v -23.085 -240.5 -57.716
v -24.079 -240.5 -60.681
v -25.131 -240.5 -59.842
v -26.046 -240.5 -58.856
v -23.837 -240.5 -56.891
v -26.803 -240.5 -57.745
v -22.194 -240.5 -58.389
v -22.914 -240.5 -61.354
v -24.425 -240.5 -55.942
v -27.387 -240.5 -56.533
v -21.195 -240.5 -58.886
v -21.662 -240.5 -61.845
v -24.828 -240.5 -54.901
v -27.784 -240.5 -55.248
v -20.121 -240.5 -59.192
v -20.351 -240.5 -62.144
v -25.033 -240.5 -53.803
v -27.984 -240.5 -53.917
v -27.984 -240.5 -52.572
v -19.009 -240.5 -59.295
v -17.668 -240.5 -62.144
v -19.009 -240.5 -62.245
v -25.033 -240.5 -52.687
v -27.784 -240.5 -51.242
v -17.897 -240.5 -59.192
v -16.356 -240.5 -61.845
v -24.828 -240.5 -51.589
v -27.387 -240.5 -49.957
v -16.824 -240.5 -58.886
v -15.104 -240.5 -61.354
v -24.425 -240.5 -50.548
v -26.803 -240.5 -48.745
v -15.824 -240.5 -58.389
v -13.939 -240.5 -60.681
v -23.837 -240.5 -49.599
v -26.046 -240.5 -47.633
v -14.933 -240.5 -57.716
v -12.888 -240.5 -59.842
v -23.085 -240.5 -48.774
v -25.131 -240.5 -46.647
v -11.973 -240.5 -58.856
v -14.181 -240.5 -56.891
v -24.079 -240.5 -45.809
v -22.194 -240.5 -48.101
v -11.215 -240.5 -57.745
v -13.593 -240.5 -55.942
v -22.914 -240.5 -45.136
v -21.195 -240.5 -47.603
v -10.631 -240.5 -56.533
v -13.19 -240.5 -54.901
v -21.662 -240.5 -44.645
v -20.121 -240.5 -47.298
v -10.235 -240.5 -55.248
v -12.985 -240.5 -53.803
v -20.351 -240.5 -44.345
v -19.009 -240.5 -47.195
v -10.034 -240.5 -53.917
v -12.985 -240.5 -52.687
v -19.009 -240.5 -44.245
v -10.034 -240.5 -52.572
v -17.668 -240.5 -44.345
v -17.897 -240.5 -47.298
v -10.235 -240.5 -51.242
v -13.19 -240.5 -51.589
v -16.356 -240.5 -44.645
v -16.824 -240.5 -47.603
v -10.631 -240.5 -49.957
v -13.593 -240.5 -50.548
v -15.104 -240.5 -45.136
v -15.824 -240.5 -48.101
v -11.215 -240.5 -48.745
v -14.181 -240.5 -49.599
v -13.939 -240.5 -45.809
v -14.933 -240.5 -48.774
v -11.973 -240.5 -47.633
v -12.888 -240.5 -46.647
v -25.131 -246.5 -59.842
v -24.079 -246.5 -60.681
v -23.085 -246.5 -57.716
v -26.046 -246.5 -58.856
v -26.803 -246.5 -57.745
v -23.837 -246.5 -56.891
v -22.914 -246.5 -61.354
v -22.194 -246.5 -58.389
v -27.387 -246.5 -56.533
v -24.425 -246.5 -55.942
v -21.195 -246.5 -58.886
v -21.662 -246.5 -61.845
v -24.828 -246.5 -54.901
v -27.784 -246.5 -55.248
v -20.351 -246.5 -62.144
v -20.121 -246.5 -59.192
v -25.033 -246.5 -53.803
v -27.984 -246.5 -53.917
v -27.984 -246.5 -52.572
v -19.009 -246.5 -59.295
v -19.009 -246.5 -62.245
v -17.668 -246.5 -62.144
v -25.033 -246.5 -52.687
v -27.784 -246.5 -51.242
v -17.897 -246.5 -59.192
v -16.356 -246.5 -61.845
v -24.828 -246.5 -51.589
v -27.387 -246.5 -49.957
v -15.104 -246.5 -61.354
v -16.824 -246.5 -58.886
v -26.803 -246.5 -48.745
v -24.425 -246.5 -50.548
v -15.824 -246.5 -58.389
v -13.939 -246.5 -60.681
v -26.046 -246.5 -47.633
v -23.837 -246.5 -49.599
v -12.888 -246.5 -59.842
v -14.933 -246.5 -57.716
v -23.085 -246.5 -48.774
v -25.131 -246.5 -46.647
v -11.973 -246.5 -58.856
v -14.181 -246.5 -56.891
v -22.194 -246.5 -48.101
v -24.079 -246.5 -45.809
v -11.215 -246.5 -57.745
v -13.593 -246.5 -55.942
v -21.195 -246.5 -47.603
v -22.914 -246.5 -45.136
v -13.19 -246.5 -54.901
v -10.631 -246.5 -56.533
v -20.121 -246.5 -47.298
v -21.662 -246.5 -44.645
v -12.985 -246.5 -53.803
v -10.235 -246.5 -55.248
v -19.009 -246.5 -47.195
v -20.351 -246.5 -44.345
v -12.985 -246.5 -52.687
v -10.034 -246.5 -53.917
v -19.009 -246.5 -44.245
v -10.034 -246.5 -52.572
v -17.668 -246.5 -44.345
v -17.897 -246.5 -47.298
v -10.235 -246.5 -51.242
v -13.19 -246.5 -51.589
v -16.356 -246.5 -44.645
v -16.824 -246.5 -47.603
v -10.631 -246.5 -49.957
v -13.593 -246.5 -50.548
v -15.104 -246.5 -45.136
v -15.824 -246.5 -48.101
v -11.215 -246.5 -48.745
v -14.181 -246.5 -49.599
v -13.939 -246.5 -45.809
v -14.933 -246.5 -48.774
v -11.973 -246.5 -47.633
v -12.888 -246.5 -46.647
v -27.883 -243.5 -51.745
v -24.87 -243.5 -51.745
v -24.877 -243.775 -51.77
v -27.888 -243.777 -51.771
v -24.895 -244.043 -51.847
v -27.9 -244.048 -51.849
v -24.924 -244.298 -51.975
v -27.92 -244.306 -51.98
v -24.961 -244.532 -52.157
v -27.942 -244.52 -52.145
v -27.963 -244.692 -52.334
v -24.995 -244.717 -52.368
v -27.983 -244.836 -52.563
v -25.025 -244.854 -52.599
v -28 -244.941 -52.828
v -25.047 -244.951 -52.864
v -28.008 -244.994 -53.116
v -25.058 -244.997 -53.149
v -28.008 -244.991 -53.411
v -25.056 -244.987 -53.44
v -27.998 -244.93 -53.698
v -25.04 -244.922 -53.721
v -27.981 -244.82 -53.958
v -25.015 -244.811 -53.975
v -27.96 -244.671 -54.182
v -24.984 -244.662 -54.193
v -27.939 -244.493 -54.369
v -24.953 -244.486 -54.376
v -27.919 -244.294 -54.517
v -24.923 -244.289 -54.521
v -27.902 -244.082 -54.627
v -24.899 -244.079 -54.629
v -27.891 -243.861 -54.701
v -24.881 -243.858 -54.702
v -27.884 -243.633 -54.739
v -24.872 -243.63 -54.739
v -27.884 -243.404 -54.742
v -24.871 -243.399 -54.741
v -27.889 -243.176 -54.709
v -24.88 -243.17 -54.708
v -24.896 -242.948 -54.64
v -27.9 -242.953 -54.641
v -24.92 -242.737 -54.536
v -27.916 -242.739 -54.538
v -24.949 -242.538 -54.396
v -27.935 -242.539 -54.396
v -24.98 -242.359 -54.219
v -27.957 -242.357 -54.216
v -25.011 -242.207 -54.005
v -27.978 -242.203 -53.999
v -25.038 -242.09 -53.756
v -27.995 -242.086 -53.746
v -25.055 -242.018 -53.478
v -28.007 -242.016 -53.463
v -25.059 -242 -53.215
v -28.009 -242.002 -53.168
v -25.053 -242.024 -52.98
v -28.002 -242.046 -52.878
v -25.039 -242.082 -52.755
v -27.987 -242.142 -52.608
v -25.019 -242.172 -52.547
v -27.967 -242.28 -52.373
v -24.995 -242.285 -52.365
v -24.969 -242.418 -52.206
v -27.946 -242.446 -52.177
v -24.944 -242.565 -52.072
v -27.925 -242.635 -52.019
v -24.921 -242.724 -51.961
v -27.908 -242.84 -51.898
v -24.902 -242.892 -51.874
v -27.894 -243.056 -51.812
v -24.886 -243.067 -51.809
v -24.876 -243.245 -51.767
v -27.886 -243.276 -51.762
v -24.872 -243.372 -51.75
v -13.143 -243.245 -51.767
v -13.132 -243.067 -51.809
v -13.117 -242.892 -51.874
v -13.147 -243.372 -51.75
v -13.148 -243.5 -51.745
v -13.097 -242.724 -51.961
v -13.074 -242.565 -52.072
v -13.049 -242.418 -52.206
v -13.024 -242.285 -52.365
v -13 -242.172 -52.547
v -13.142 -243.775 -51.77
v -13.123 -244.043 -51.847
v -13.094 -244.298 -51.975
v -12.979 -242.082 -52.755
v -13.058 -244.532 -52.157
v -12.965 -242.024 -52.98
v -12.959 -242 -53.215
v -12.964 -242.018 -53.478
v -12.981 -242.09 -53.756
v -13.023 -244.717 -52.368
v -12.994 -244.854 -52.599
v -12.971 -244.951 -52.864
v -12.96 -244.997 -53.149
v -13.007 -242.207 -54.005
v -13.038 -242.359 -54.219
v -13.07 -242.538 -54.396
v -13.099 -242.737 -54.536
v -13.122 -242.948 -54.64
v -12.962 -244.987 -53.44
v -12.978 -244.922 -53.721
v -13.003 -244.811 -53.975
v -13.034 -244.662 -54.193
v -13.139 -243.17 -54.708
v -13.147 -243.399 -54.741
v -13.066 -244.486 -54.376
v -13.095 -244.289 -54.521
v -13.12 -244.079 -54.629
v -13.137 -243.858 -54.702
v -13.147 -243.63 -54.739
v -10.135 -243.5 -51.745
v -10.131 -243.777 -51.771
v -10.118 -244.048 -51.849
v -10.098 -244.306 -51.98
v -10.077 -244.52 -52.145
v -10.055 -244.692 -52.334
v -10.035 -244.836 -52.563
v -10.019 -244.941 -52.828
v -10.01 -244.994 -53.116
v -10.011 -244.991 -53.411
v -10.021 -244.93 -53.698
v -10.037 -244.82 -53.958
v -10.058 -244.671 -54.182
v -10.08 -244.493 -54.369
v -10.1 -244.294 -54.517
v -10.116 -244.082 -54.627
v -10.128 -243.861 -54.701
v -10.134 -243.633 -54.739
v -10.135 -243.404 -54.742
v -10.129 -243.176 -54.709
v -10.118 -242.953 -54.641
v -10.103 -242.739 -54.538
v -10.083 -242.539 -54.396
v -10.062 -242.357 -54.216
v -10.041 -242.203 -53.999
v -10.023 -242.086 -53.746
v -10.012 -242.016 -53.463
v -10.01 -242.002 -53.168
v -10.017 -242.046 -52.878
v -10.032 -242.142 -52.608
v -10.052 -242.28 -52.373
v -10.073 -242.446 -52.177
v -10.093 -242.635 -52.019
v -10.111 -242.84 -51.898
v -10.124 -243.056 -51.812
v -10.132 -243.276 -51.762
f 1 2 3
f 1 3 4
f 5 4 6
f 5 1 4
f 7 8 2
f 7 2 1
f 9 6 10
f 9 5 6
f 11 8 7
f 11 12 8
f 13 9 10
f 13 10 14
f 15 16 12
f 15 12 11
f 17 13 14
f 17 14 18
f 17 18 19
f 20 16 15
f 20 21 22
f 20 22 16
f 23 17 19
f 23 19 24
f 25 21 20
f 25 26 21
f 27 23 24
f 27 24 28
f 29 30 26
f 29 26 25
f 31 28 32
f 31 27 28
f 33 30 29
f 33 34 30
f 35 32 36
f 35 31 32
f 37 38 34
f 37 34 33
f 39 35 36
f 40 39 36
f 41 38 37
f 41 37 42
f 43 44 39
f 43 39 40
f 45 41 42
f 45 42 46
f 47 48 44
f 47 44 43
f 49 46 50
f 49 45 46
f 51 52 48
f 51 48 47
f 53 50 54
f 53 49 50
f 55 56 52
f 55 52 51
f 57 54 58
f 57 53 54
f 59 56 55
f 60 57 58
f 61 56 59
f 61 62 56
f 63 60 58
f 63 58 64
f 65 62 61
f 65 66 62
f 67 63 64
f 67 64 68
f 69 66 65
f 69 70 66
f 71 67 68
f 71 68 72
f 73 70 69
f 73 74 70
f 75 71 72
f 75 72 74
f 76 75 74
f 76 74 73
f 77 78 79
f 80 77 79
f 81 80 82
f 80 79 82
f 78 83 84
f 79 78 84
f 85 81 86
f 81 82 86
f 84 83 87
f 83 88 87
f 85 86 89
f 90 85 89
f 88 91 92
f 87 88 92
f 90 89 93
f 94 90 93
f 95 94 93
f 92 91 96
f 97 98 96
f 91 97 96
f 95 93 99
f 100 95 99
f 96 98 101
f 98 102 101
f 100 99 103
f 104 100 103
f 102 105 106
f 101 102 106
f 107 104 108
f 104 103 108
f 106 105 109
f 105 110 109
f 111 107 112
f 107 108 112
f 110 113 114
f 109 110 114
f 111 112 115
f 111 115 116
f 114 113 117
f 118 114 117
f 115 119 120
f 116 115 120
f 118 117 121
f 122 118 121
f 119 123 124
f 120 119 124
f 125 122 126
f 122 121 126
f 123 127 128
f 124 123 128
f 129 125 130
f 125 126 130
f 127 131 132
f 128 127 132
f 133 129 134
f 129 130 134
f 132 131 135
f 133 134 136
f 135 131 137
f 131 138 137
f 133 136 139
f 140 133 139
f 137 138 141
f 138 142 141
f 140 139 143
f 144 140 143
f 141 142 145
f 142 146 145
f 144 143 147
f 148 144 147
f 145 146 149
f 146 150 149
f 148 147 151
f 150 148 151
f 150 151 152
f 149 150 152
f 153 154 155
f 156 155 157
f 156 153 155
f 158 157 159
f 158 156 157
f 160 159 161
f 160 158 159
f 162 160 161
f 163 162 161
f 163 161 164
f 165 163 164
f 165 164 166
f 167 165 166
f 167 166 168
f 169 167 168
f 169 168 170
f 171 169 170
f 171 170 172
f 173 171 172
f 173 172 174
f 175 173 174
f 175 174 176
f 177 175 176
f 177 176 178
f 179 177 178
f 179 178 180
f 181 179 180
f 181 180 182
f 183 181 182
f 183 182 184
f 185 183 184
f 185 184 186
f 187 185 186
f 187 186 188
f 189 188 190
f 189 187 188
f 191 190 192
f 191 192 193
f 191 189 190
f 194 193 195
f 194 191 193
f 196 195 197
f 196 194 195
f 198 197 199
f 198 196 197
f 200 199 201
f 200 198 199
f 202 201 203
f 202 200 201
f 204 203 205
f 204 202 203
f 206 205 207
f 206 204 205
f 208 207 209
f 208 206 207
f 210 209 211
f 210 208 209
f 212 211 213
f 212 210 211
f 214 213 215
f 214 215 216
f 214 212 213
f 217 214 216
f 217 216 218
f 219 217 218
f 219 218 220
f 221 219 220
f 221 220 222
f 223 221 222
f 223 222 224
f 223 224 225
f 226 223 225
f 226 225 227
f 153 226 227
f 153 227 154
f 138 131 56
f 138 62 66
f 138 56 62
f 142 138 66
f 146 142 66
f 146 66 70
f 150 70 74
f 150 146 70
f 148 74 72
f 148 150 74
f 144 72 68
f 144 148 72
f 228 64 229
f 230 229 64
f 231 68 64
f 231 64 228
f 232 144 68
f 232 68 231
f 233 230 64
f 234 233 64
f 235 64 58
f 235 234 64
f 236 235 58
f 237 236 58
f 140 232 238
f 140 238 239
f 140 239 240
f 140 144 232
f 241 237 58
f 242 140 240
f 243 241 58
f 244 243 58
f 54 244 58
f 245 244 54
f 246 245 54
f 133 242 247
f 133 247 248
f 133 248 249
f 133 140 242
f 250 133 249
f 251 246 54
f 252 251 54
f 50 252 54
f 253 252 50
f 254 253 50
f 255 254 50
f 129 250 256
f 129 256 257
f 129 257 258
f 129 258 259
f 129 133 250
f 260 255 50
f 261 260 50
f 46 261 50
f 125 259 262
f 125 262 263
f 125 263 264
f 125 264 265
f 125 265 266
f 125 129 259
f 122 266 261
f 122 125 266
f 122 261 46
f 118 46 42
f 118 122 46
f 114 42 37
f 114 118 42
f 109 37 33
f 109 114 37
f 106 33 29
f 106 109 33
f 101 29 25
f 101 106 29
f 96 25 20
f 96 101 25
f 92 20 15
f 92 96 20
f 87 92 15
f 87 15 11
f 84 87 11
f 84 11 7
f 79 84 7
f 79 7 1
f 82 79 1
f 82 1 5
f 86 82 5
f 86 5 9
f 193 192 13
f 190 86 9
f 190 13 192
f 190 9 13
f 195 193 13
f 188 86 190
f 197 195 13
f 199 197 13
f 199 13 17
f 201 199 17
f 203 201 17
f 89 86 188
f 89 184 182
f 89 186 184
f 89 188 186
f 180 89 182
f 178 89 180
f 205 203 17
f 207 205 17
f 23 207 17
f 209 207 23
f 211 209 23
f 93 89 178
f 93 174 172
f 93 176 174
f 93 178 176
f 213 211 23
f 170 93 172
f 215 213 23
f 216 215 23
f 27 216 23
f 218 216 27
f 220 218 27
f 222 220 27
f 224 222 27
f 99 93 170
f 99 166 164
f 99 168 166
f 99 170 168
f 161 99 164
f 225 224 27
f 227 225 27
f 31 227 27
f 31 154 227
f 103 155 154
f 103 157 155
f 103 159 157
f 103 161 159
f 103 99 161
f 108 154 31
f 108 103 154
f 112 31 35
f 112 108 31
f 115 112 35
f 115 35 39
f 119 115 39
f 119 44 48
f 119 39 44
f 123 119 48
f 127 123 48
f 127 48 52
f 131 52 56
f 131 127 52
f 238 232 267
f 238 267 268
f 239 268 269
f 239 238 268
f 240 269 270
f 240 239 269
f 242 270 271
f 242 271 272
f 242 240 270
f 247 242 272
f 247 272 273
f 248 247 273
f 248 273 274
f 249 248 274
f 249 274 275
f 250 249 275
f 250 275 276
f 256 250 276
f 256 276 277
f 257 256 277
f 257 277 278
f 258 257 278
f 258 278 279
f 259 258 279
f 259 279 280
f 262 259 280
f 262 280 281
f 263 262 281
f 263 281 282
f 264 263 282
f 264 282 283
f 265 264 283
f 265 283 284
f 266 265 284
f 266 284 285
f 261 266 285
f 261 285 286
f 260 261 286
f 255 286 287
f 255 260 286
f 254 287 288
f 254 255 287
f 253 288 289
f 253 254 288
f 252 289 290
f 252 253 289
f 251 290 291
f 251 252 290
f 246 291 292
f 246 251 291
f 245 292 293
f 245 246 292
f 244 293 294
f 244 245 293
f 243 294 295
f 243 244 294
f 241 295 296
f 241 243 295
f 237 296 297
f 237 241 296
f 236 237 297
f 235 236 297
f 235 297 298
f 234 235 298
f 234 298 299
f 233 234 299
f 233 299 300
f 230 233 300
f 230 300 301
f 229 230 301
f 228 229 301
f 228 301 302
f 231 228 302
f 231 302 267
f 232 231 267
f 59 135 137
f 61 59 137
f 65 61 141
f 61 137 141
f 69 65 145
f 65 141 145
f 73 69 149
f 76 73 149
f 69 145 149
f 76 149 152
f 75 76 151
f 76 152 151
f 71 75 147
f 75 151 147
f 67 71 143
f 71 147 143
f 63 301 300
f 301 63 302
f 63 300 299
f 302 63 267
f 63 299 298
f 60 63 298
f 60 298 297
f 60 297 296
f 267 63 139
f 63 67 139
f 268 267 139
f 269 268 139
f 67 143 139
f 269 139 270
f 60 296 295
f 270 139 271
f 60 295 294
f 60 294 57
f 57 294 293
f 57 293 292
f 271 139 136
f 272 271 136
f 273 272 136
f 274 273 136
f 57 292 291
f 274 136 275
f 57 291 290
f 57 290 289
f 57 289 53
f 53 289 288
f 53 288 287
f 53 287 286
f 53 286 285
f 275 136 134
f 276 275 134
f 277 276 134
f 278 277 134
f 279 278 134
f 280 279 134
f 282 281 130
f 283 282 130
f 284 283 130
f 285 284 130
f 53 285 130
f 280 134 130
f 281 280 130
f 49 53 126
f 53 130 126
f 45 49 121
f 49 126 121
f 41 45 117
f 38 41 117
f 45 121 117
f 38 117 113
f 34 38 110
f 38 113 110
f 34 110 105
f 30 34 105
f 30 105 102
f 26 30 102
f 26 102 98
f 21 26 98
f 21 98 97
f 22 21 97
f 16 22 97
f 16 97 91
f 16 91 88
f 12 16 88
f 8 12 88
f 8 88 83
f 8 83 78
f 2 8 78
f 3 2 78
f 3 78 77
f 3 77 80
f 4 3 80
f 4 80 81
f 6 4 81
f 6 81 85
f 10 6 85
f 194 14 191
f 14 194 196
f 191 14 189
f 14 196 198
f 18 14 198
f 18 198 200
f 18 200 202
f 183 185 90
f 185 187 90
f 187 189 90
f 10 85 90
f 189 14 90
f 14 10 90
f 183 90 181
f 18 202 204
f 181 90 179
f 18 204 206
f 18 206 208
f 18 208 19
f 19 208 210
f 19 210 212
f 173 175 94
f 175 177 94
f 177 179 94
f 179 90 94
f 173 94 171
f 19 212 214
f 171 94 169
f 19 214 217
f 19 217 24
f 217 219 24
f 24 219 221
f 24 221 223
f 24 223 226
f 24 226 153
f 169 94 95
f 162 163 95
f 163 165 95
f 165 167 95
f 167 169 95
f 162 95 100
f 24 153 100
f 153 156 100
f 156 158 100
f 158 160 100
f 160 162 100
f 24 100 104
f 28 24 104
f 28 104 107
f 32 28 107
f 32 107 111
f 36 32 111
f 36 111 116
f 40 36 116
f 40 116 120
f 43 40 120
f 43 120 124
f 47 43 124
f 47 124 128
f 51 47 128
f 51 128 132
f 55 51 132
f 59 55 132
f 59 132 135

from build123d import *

# Parameters (mm, degrees)
COLLAR_STOCK_SKETCH_R             = 9
COLLAR_STOCK_DEPTH                = 6
AXLE_COLLAR_BORE_SKETCH_R         = 6.05
AXLE_COLLAR_BORE_DEPTH            = 6.2
POSITIVE_SPRING_PIN_BORE_SKETCH_R = 1.5
POSITIVE_SPRING_PIN_BORE_DEPTH    = 20


with BuildPart() as part:
    # Collar stock sketch → Collar stock (new body)
    with BuildSketch(Plane(origin=(0, -246.5, 0), x_dir=(1, 0, 0), z_dir=(0, 1, 0))):
        with Locations(Location((-19.009182883, 53.244882879, 0), (0, 0, 270))):
            Circle(COLLAR_STOCK_SKETCH_R)
    extrude(amount=COLLAR_STOCK_DEPTH)

    # Axle collar bore sketch → Axle collar bore (cut)
    with BuildSketch(Plane(origin=(0, -246.6, 0), x_dir=(1, 0, 0), z_dir=(0, 1, 0))):
        with Locations(Location((-19.009182883, 53.244882879, 0), (0, 0, 270))):
            Circle(AXLE_COLLAR_BORE_SKETCH_R)
    extrude(amount=AXLE_COLLAR_BORE_DEPTH, mode=Mode.SUBTRACT)

    # Positive spring pin bore sketch → Positive spring pin bore (cut)
    with BuildSketch(Plane(origin=(-29.009182883, 0, 0), x_dir=(0, 0, -1), z_dir=(1, 0, 0))):
        with Locations(Location((53.244882879, -243.5, 0), (0, 0, 180))):
            Circle(POSITIVE_SPRING_PIN_BORE_SKETCH_R)
    extrude(amount=POSITIVE_SPRING_PIN_BORE_DEPTH, mode=Mode.SUBTRACT)


solid = part.part
